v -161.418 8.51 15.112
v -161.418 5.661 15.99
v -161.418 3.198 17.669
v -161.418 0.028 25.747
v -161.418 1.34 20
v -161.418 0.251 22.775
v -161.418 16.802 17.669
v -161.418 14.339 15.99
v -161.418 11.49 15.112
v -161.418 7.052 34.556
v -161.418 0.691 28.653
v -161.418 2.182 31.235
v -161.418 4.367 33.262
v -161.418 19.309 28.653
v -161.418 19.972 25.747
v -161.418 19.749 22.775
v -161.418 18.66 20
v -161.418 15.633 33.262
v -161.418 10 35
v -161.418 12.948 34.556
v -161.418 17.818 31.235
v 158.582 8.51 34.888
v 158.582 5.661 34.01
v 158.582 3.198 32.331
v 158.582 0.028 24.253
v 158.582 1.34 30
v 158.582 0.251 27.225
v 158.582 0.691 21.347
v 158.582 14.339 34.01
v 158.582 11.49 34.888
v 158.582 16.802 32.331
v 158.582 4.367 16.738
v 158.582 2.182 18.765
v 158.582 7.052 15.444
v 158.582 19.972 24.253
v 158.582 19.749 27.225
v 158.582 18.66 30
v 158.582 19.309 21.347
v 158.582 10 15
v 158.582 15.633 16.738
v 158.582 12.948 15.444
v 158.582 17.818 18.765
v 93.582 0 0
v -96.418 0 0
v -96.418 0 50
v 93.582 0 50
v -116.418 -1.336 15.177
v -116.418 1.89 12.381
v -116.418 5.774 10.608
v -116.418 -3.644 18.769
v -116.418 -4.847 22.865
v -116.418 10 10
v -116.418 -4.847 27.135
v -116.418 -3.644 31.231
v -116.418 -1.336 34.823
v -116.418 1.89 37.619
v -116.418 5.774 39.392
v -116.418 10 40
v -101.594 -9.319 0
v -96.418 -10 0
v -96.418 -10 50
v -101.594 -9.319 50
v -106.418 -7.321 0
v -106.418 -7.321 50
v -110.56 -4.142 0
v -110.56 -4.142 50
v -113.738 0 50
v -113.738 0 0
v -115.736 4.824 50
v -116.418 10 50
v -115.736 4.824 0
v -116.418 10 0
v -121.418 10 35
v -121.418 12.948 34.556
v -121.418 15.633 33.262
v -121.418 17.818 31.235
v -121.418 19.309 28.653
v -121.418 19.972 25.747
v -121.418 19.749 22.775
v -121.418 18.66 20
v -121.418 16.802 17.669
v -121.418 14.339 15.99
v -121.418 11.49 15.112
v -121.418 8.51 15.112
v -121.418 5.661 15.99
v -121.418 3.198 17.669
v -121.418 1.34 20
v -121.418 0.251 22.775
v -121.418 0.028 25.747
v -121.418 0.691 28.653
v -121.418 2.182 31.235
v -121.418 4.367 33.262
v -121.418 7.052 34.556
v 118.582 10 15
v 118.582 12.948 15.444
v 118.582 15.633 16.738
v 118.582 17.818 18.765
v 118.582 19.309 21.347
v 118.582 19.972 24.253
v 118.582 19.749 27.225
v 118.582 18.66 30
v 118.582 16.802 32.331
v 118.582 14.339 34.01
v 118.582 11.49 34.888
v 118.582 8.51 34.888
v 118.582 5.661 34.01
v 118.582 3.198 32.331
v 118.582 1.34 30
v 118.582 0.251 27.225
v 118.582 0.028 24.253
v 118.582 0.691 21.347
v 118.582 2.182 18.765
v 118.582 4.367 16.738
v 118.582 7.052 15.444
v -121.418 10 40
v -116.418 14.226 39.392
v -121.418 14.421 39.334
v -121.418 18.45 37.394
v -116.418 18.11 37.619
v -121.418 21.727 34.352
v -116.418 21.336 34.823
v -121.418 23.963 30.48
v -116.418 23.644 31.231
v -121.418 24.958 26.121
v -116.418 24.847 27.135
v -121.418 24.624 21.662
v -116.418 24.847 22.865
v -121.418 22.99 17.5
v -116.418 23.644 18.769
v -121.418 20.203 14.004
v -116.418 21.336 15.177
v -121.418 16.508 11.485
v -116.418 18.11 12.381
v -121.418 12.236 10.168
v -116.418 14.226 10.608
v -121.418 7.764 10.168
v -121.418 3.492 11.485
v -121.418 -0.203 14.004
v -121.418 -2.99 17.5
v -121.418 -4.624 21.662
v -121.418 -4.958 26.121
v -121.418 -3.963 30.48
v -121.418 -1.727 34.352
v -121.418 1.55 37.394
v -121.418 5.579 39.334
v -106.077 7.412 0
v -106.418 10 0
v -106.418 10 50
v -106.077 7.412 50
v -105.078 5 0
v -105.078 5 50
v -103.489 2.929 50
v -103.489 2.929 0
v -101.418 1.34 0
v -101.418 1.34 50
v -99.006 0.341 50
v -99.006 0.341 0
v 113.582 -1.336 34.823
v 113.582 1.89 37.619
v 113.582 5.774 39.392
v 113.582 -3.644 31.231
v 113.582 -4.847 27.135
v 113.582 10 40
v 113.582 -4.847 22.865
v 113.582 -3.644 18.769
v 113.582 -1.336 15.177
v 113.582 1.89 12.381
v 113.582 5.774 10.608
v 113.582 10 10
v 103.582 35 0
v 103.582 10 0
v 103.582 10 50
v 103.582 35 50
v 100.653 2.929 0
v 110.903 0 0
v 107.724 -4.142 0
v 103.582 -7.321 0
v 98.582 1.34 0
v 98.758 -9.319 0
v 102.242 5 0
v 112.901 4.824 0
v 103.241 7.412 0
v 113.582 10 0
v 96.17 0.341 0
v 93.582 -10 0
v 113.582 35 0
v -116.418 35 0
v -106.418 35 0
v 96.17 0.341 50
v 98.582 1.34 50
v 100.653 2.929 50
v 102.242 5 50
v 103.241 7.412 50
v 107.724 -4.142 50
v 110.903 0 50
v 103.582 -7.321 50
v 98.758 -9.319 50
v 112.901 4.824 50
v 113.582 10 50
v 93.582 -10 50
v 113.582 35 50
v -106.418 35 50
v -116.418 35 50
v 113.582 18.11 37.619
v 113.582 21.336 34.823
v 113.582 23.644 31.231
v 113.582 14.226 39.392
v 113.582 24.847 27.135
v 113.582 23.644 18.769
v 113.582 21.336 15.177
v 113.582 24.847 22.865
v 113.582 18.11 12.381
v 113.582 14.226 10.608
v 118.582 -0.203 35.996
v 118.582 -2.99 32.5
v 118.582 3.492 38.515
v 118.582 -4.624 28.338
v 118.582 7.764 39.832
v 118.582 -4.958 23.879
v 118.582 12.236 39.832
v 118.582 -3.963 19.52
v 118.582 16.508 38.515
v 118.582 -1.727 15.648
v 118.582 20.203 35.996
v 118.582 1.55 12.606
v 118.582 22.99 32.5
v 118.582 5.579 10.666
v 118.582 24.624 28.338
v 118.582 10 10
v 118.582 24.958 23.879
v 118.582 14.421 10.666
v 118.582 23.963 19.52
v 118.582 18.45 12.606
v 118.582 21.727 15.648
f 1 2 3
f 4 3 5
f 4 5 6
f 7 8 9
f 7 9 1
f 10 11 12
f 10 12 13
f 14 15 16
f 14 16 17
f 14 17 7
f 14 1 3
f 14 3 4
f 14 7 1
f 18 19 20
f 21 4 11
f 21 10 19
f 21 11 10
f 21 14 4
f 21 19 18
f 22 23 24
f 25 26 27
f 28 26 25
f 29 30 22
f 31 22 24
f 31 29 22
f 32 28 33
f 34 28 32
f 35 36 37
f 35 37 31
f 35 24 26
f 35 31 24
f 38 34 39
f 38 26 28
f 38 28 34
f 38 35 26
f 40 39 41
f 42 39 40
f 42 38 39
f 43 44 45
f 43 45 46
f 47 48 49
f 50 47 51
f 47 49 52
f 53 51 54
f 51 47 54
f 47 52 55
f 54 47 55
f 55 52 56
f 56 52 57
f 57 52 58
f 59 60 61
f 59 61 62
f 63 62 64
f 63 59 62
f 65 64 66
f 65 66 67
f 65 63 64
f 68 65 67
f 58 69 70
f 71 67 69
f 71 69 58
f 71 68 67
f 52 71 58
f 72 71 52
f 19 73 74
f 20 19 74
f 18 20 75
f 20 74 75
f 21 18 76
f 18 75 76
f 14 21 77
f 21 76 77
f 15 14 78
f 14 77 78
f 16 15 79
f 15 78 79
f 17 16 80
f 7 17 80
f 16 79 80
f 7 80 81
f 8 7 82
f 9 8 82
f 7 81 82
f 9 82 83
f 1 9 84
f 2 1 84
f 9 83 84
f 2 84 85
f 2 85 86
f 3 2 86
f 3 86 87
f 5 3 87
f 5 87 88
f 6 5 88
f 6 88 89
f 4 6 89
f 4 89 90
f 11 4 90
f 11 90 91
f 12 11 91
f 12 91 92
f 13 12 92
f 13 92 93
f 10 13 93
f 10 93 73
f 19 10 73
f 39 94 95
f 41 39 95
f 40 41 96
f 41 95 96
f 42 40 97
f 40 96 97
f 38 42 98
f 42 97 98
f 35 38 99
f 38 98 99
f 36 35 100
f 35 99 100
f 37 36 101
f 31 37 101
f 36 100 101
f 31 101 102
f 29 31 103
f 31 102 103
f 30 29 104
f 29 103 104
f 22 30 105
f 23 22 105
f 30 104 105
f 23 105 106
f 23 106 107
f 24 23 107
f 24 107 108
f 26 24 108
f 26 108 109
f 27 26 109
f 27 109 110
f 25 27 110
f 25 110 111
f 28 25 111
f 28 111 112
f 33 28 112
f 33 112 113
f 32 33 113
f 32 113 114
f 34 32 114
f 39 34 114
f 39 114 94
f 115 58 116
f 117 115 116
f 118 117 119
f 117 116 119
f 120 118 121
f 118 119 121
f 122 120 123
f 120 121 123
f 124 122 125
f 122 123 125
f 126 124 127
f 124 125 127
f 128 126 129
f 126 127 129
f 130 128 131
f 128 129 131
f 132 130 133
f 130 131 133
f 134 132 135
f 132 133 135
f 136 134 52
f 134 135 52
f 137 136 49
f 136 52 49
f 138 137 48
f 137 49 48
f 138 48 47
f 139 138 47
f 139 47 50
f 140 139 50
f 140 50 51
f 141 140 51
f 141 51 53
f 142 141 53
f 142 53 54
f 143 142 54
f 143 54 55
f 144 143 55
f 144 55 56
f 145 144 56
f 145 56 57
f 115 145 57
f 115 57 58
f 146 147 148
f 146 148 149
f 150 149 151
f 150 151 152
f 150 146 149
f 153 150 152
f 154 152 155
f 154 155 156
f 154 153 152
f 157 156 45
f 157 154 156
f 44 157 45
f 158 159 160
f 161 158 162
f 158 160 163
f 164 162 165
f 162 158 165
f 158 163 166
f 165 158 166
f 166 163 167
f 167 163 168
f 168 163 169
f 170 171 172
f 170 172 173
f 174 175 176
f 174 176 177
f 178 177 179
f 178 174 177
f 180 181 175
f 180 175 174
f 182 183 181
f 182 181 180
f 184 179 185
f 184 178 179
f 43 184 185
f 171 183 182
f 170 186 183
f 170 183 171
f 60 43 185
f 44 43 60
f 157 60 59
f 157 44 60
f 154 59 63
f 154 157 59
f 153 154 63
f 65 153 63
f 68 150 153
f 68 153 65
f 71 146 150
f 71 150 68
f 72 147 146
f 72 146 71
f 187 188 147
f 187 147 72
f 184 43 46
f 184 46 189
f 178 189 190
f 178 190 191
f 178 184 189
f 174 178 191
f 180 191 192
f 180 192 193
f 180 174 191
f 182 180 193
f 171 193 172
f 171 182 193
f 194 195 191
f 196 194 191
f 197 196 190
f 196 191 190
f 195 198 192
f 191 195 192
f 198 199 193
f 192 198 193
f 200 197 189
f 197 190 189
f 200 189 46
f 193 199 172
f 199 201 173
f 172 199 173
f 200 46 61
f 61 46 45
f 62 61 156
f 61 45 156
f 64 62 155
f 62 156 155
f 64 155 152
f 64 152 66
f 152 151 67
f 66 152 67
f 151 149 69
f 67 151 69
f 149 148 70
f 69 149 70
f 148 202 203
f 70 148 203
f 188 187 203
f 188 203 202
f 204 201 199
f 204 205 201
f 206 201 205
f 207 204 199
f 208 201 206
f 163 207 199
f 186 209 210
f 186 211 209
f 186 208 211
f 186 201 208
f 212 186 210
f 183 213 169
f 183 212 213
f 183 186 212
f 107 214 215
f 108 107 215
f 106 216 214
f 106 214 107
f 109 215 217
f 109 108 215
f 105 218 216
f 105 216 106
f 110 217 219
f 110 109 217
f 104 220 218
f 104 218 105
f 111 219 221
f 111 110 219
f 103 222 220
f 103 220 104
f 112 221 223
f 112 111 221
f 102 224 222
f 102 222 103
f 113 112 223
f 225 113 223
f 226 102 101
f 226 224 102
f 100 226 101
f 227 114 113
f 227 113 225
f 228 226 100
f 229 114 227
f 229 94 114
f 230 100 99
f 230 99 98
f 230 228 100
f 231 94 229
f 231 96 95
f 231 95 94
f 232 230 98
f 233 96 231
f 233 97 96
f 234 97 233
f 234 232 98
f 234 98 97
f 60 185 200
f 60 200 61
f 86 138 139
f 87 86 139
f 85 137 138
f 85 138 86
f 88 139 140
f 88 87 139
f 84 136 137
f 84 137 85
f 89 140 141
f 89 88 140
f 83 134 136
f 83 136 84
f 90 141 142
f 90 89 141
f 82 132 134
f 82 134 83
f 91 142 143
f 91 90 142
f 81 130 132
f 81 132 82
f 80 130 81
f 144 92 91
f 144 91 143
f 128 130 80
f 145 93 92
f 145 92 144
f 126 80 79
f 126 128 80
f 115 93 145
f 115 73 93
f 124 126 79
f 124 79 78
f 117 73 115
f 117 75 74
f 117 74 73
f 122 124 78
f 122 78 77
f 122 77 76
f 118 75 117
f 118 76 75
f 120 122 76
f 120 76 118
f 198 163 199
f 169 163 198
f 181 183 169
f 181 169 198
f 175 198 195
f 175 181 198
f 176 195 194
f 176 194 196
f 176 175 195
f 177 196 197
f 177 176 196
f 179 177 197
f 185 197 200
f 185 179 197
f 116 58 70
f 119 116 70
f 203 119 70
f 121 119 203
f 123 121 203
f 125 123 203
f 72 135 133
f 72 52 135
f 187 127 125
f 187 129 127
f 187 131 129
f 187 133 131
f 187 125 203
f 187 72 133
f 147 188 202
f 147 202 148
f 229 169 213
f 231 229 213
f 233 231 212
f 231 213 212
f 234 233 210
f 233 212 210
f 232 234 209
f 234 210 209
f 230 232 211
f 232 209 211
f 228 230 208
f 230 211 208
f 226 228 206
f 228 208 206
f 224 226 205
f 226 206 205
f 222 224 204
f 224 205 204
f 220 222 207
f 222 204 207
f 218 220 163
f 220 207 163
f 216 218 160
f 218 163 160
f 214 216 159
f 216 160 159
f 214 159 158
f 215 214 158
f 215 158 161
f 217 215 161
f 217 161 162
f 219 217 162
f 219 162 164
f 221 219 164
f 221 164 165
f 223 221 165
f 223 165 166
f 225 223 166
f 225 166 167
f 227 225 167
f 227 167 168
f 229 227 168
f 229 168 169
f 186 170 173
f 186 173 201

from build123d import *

# Parameters (mm, degrees)
EXTRUDE_THIN2_DEPTH  = 50
SKETCH3_R            = 10
BOSS_EXTRUDE7_DEPTH  = 45
SKETCH8_R            = 10
BOSS_EXTRUDE8_DEPTH  = 45
SKETCH9_R            = 15
BOSS_EXTRUDE9_DEPTH  = 5
SKETCH10_R           = 15
BOSS_EXTRUDE10_DEPTH = 5


with BuildPart() as part:
    # Sketch1 → Extrude-Thin2 (new body)
    with BuildSketch(Plane.XY):
        with BuildLine():
            Line((-106.417898558, 35), (-106.417898558, 10))
            ThreePointArc((-106.417898558, 10), (-103.48896637, 2.928932188), (-96.417898558, 0))
            Line((-96.417898558, 0), (93.582101442, 0))
            ThreePointArc((93.582101442, 0), (100.653169254, 2.928932188), (103.582101442, 10))
            Line((103.582101442, 10), (103.582101442, 35))
            Line((103.582101442, 35), (113.582101442, 35))
            Line((113.582101442, 35), (113.582101442, 10))
            ThreePointArc((113.582101442, 10), (107.724237066, -4.142135624), (93.582101442, -10))
            Line((93.582101442, -10), (-96.417898558, -10))
            ThreePointArc((-96.417898558, -10), (-110.560034182, -4.142135624), (-116.417898558, 10))
            Line((-116.417898558, 10), (-116.417898558, 35))
            Line((-116.417898558, 35), (-106.417898558, 35))
        make_face()
    extrude(amount=EXTRUDE_THIN2_DEPTH)

    # Sketch3 → Boss-Extrude7 (add)
    with BuildSketch(Plane(origin=(113.582101442, 0, 0), x_dir=(0, 0, -1), z_dir=(1, 0, 0))):
        with Locations((-25, 10)):
            Circle(SKETCH3_R)
    extrude(amount=BOSS_EXTRUDE7_DEPTH)

    # Sketch8 → Boss-Extrude8 (add)
    with BuildSketch(Plane.ZY.offset(116.417898558)):
        with Locations((25, 10)):
            Circle(SKETCH8_R)
    extrude(amount=BOSS_EXTRUDE8_DEPTH)

    # Sketch9 → Boss-Extrude9 (add)
    with BuildSketch(Plane.ZY.offset(116.417898558)):
        with Locations((25, 10)):
            Circle(SKETCH9_R)
    extrude(amount=BOSS_EXTRUDE9_DEPTH)

    # Sketch10 → Boss-Extrude10 (add)
    with BuildSketch(Plane(origin=(113.582101442, 0, 0), x_dir=(0, 0, -1), z_dir=(1, 0, 0))):
        with Locations((-25, 10)):
            Circle(SKETCH10_R)
    extrude(amount=BOSS_EXTRUDE10_DEPTH)


solid = part.part
